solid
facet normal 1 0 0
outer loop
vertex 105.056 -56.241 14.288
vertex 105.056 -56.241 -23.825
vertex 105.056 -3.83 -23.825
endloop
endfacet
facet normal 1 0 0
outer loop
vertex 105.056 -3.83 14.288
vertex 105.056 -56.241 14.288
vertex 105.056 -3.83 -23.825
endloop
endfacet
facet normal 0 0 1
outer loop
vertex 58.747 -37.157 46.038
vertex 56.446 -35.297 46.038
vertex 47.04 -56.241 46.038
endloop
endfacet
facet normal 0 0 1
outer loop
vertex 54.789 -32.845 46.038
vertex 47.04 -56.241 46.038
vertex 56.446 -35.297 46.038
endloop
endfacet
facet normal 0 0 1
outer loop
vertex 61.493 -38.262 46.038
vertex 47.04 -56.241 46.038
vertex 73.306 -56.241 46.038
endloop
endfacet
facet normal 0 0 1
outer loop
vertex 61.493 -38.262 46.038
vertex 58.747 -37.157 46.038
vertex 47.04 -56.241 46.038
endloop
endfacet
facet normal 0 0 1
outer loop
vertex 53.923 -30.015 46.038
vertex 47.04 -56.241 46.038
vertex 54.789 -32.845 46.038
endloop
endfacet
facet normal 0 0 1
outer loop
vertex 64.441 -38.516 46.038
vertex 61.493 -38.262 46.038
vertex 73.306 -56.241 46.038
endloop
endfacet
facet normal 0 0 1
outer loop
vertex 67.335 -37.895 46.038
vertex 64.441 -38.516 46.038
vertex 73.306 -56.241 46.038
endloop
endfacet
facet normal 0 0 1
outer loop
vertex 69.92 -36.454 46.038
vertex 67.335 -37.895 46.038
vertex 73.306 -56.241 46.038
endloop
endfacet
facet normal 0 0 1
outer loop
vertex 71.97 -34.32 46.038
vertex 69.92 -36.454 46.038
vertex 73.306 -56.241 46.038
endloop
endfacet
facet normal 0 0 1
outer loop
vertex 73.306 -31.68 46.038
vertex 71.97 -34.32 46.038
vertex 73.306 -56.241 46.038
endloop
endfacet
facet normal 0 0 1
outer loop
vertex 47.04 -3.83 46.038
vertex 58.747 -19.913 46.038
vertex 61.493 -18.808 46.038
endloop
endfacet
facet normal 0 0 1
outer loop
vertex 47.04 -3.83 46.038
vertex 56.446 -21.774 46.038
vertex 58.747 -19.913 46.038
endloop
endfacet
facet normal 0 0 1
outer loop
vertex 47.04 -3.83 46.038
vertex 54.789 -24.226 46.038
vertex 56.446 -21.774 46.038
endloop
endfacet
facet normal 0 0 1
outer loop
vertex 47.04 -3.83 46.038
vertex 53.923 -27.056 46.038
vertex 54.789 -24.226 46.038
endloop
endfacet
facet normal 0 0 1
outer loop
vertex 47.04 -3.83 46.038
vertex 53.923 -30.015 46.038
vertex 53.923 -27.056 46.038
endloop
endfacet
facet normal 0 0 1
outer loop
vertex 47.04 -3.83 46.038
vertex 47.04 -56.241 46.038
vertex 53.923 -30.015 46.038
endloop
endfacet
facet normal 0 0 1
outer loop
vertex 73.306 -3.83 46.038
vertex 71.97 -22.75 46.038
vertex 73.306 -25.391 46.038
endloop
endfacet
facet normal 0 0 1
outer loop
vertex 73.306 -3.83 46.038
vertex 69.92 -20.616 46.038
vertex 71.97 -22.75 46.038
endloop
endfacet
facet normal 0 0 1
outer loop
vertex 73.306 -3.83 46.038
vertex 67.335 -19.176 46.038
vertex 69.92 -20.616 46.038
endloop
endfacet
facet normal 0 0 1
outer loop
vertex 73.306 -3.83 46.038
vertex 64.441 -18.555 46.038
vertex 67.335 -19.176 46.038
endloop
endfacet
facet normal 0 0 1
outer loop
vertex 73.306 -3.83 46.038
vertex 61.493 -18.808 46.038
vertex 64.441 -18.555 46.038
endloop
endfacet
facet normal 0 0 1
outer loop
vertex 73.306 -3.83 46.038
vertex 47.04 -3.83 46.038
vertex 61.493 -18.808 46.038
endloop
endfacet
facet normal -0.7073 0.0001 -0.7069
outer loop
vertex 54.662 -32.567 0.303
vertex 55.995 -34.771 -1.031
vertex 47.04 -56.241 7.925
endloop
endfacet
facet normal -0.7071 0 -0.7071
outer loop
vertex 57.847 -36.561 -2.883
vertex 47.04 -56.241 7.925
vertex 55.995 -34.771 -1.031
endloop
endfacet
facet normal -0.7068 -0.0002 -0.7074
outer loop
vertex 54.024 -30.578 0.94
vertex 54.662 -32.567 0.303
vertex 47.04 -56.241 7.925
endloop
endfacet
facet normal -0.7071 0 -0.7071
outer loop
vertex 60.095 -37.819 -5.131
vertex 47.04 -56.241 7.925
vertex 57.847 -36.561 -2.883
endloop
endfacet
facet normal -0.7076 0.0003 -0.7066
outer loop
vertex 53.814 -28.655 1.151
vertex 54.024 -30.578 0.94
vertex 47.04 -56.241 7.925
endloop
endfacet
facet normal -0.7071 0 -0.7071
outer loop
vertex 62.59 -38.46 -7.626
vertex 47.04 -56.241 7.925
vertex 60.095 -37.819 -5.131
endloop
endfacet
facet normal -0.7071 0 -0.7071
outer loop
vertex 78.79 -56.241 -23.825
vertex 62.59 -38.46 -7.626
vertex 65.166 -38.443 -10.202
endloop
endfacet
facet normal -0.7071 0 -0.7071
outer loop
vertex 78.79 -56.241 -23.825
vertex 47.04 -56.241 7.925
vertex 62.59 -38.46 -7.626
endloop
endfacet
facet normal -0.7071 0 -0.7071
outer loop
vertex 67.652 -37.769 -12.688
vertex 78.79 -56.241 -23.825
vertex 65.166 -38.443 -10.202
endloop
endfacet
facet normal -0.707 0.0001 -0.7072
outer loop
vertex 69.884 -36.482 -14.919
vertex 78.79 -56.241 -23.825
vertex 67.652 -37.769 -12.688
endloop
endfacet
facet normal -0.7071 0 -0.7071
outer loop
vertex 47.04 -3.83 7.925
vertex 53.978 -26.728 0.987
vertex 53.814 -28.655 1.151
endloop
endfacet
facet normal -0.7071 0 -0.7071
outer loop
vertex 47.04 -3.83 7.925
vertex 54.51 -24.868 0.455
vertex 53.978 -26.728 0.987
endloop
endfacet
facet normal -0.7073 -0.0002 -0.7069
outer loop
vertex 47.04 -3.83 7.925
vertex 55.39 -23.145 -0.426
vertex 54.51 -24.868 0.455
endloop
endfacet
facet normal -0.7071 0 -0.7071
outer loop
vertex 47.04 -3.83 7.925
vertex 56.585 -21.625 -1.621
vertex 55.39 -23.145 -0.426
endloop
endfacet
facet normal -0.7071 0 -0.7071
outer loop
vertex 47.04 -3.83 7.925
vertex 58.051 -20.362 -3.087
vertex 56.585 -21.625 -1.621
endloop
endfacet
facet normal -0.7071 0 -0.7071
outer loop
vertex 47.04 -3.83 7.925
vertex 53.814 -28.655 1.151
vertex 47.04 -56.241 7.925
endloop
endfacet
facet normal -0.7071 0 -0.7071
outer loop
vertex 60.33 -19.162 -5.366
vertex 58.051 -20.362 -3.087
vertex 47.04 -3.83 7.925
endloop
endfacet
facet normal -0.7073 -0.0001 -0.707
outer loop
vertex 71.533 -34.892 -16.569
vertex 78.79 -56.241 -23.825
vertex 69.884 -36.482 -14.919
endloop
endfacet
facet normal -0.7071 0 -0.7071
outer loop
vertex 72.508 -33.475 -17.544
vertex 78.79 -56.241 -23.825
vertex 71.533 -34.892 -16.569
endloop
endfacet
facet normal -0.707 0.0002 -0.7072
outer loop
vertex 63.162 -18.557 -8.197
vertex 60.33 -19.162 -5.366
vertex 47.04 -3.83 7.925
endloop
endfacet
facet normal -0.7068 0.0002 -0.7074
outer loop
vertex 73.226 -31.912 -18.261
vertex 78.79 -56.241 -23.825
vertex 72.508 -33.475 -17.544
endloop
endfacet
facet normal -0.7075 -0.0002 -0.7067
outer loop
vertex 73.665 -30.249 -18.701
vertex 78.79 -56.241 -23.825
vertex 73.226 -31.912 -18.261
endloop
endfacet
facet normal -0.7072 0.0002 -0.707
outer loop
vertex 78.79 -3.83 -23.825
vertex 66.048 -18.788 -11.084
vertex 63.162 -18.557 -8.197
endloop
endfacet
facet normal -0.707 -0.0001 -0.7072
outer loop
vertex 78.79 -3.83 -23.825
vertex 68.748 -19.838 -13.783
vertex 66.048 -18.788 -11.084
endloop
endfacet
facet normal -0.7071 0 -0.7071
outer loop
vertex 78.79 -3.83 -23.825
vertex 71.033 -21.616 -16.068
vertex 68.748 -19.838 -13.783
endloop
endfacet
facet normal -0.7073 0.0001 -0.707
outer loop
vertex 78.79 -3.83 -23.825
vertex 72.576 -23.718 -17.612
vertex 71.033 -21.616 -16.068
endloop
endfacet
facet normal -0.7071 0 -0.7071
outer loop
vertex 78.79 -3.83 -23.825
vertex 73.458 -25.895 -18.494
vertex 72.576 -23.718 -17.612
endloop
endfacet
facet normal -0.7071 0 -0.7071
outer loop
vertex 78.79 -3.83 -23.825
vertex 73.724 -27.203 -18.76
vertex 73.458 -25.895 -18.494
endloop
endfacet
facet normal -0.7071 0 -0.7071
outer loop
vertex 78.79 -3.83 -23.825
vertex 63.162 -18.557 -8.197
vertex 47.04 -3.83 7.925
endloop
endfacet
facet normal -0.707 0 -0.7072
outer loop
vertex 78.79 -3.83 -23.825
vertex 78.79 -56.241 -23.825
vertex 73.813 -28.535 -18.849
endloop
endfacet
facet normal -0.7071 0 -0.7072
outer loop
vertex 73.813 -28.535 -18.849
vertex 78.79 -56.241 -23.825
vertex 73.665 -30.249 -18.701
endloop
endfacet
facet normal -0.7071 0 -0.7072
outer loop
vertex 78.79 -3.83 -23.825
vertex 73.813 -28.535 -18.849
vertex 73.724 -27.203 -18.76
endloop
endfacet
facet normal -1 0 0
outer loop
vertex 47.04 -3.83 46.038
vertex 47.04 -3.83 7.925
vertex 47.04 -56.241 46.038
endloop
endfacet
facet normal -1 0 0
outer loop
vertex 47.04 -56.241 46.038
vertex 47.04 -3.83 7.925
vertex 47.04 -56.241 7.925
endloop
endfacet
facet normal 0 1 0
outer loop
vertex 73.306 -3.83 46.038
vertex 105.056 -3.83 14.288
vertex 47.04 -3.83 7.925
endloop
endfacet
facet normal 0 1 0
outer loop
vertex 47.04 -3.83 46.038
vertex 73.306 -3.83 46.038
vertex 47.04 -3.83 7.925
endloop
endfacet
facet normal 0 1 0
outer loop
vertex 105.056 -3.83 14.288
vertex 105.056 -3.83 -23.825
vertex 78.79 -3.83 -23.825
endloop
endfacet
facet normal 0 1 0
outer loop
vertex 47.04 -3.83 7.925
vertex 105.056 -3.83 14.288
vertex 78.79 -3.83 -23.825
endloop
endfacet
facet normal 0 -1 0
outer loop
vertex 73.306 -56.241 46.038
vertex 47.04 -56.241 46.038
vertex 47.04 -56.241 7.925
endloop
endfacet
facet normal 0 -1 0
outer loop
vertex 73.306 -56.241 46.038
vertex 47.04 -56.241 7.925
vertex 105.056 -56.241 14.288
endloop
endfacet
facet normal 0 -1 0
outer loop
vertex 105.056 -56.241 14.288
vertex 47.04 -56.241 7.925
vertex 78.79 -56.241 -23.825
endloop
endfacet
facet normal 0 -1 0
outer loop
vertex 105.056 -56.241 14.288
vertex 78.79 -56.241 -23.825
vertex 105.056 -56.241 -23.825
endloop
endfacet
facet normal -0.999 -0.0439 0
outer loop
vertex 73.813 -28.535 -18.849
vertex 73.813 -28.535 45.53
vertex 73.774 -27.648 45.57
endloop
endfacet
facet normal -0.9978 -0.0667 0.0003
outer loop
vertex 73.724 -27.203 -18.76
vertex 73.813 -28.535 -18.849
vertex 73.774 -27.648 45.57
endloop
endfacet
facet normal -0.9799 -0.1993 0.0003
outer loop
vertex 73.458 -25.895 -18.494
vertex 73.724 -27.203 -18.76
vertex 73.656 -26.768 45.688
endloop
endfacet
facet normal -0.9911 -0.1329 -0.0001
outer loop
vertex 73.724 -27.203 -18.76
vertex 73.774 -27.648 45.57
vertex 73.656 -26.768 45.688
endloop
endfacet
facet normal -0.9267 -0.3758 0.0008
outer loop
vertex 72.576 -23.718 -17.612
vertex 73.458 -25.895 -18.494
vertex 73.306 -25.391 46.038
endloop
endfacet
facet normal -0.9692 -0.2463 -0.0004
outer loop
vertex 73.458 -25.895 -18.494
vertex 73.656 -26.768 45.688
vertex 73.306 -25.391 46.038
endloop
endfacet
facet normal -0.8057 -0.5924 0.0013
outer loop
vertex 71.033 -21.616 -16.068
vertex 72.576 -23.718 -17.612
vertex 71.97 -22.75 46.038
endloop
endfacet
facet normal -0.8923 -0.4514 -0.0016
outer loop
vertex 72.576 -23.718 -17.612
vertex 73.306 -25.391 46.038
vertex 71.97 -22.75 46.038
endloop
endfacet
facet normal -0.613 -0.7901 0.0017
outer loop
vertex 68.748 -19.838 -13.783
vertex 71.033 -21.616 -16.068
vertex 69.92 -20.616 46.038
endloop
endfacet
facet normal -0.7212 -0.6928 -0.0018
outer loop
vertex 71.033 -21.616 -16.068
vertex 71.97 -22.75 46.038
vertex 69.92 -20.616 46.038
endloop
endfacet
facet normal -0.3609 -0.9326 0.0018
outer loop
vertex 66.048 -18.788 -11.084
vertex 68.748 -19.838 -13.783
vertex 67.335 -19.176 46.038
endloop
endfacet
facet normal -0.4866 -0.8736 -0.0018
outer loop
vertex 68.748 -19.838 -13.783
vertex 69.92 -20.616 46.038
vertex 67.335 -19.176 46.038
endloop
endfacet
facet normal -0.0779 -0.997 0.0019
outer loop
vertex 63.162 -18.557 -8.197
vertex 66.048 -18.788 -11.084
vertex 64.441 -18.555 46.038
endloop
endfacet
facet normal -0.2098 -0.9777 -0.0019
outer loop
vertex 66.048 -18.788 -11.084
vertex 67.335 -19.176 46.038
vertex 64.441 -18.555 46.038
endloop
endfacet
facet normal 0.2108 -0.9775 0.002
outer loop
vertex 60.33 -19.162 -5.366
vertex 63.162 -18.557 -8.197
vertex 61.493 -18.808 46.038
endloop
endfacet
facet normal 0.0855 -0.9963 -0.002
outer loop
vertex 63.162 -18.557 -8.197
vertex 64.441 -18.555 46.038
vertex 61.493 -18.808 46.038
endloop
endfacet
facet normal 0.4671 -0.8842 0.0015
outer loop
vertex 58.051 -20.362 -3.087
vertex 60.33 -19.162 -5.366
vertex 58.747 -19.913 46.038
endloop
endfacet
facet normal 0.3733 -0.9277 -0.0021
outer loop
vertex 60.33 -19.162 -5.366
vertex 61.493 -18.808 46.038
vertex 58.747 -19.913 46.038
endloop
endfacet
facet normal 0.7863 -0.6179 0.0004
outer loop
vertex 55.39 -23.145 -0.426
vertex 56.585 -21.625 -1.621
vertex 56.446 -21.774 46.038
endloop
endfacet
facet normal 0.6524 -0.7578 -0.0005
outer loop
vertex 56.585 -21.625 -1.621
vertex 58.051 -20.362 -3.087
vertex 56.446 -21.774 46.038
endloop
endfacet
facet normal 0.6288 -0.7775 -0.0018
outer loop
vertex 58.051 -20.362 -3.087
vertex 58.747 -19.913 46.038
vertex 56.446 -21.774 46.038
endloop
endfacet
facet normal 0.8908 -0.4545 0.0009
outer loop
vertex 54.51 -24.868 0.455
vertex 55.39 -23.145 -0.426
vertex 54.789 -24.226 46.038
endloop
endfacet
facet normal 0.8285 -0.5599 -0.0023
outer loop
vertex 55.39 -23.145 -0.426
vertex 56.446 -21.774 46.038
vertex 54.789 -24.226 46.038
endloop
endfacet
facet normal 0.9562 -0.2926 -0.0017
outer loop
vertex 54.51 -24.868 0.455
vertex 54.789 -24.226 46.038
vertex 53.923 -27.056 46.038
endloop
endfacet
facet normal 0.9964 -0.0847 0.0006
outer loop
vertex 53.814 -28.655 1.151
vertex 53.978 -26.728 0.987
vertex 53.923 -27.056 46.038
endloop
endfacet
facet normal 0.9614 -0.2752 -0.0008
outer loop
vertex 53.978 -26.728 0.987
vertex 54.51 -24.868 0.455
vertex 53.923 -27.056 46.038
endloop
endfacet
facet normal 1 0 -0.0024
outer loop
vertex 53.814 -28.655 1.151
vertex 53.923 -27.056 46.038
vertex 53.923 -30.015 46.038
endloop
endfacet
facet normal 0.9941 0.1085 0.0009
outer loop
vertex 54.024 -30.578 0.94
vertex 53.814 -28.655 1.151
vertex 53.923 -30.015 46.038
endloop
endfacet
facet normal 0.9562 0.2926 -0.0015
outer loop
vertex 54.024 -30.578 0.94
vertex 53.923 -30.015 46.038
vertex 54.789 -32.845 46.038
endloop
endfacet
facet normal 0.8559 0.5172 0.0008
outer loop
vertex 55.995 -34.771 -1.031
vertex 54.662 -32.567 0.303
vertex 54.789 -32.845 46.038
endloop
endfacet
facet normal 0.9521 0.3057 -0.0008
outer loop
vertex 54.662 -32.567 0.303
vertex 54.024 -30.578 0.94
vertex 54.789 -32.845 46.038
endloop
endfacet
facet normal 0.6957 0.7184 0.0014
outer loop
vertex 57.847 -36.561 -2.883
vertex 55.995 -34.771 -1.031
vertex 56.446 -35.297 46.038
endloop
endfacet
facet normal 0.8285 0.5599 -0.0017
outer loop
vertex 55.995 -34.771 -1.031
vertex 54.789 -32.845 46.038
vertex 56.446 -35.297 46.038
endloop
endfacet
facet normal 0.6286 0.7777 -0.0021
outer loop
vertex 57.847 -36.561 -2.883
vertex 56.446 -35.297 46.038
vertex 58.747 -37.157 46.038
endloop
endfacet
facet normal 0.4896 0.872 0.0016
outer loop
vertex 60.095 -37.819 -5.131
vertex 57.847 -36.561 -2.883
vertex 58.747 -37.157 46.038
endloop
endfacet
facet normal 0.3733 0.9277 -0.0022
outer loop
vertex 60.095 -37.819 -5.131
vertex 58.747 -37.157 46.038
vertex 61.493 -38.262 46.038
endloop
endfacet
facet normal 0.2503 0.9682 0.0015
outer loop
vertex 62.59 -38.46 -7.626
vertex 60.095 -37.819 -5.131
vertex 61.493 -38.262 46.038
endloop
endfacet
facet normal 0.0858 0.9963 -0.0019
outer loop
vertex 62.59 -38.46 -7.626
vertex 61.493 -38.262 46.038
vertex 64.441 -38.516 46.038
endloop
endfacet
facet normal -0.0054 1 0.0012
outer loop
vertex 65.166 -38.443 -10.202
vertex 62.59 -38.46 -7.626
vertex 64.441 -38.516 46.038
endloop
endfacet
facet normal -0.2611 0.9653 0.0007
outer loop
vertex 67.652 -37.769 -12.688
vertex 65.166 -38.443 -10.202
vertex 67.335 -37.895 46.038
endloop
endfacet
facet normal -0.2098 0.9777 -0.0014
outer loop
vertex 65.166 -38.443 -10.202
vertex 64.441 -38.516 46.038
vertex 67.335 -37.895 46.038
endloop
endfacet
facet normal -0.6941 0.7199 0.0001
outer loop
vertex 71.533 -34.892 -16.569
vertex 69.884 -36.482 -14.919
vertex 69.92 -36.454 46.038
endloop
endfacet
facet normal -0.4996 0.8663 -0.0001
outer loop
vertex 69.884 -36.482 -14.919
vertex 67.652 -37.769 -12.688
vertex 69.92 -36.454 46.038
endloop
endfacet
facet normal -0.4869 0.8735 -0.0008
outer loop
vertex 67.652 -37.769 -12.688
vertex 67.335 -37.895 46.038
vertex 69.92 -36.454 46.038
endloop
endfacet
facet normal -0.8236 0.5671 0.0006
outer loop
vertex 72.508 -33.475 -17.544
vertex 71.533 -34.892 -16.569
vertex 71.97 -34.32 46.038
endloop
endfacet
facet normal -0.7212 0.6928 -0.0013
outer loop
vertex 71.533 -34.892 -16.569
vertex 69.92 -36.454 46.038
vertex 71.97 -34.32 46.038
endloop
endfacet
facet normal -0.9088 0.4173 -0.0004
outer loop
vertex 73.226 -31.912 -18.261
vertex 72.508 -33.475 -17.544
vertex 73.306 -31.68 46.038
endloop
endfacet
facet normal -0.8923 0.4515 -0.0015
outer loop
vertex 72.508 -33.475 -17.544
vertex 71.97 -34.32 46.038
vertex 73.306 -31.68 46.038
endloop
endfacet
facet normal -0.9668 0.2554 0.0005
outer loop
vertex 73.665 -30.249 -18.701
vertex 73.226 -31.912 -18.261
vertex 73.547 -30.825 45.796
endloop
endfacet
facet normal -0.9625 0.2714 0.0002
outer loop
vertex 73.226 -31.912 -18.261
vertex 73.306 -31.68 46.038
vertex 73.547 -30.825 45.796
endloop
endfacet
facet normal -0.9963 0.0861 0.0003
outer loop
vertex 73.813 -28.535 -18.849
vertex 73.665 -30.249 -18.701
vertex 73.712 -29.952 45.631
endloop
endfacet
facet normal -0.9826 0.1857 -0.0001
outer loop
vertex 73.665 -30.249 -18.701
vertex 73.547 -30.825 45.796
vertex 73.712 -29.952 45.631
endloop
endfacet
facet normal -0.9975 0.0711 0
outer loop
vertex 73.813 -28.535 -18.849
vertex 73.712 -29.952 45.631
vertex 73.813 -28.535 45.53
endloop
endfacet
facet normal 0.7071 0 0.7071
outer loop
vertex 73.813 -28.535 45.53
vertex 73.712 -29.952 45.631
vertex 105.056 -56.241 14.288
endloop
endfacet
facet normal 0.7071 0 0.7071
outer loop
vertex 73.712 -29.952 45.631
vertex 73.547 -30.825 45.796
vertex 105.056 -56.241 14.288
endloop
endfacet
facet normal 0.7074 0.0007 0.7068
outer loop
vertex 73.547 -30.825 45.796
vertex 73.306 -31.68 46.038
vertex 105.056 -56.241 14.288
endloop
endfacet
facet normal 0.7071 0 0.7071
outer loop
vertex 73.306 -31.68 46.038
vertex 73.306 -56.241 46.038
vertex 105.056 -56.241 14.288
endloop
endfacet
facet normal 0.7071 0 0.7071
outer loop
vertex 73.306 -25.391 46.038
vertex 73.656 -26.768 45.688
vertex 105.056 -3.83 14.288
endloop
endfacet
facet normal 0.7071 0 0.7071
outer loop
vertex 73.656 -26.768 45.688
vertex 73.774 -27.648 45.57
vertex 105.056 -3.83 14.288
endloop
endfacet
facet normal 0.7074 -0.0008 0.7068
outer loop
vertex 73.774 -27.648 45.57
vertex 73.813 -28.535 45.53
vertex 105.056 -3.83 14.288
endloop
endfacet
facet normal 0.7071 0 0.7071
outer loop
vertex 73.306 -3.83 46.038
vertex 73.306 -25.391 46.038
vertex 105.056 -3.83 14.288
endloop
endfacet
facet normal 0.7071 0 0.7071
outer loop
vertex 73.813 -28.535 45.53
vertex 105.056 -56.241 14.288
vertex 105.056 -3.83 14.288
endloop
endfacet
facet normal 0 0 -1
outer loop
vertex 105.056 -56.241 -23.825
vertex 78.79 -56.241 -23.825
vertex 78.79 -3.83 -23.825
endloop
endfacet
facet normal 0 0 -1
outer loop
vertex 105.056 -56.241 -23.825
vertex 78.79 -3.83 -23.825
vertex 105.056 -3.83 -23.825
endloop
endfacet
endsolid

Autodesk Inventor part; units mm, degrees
ref_plane "YZ Plane" through (0, 0, 0) normal (1, 0, 0) x (0, 1, 0)
ref_plane "XZ Plane" through (0, 0, 0) normal (0, 1, 0) x (-1, 0, 0)
ref_plane "XY Plane" through (0, 0, 0) normal (0, 0, 1) x (1, 0, 0)
sketch "Sketch1" plane through (0, 0, 0) normal (0, 0, 1) x (1, 0, 0)
  line L0 (105.0559, -3.8299) -> (47.0396, -3.8299)
  line L1 (47.0396, -3.8299) -> (47.0396, -56.241)
  line L2 (47.0396, -56.241) -> (105.0559, -56.241)
  line L3 (105.0559, -56.241) -> (105.0559, -3.8299)
  point P0 (0, 0)
extrude "Extrusion1" add sketch "Sketch1" along normal blind 46.0375 and the other way blind 23.8252
chamfer "Chamfer1" distance 31.75 angle 45 1 edges at (47.0396, -30.0355, -23.8252)
chamfer "Chamfer2" distance 31.75 angle 45 1 edges at (105.0559, -30.0355, 46.0375)
sketch "Sketch2" plane through (0, 0, 46.0375) normal (0, 0, 1) x (1, 0, 0)
  circle A0 centre (63.8131, -28.5354) radius 10
  point P0 (0, 0)
  dimension "d11" = 20
extrude "Extrusion2" cut sketch "Sketch2" against normal through all
properties part number "MotorCarrier"
